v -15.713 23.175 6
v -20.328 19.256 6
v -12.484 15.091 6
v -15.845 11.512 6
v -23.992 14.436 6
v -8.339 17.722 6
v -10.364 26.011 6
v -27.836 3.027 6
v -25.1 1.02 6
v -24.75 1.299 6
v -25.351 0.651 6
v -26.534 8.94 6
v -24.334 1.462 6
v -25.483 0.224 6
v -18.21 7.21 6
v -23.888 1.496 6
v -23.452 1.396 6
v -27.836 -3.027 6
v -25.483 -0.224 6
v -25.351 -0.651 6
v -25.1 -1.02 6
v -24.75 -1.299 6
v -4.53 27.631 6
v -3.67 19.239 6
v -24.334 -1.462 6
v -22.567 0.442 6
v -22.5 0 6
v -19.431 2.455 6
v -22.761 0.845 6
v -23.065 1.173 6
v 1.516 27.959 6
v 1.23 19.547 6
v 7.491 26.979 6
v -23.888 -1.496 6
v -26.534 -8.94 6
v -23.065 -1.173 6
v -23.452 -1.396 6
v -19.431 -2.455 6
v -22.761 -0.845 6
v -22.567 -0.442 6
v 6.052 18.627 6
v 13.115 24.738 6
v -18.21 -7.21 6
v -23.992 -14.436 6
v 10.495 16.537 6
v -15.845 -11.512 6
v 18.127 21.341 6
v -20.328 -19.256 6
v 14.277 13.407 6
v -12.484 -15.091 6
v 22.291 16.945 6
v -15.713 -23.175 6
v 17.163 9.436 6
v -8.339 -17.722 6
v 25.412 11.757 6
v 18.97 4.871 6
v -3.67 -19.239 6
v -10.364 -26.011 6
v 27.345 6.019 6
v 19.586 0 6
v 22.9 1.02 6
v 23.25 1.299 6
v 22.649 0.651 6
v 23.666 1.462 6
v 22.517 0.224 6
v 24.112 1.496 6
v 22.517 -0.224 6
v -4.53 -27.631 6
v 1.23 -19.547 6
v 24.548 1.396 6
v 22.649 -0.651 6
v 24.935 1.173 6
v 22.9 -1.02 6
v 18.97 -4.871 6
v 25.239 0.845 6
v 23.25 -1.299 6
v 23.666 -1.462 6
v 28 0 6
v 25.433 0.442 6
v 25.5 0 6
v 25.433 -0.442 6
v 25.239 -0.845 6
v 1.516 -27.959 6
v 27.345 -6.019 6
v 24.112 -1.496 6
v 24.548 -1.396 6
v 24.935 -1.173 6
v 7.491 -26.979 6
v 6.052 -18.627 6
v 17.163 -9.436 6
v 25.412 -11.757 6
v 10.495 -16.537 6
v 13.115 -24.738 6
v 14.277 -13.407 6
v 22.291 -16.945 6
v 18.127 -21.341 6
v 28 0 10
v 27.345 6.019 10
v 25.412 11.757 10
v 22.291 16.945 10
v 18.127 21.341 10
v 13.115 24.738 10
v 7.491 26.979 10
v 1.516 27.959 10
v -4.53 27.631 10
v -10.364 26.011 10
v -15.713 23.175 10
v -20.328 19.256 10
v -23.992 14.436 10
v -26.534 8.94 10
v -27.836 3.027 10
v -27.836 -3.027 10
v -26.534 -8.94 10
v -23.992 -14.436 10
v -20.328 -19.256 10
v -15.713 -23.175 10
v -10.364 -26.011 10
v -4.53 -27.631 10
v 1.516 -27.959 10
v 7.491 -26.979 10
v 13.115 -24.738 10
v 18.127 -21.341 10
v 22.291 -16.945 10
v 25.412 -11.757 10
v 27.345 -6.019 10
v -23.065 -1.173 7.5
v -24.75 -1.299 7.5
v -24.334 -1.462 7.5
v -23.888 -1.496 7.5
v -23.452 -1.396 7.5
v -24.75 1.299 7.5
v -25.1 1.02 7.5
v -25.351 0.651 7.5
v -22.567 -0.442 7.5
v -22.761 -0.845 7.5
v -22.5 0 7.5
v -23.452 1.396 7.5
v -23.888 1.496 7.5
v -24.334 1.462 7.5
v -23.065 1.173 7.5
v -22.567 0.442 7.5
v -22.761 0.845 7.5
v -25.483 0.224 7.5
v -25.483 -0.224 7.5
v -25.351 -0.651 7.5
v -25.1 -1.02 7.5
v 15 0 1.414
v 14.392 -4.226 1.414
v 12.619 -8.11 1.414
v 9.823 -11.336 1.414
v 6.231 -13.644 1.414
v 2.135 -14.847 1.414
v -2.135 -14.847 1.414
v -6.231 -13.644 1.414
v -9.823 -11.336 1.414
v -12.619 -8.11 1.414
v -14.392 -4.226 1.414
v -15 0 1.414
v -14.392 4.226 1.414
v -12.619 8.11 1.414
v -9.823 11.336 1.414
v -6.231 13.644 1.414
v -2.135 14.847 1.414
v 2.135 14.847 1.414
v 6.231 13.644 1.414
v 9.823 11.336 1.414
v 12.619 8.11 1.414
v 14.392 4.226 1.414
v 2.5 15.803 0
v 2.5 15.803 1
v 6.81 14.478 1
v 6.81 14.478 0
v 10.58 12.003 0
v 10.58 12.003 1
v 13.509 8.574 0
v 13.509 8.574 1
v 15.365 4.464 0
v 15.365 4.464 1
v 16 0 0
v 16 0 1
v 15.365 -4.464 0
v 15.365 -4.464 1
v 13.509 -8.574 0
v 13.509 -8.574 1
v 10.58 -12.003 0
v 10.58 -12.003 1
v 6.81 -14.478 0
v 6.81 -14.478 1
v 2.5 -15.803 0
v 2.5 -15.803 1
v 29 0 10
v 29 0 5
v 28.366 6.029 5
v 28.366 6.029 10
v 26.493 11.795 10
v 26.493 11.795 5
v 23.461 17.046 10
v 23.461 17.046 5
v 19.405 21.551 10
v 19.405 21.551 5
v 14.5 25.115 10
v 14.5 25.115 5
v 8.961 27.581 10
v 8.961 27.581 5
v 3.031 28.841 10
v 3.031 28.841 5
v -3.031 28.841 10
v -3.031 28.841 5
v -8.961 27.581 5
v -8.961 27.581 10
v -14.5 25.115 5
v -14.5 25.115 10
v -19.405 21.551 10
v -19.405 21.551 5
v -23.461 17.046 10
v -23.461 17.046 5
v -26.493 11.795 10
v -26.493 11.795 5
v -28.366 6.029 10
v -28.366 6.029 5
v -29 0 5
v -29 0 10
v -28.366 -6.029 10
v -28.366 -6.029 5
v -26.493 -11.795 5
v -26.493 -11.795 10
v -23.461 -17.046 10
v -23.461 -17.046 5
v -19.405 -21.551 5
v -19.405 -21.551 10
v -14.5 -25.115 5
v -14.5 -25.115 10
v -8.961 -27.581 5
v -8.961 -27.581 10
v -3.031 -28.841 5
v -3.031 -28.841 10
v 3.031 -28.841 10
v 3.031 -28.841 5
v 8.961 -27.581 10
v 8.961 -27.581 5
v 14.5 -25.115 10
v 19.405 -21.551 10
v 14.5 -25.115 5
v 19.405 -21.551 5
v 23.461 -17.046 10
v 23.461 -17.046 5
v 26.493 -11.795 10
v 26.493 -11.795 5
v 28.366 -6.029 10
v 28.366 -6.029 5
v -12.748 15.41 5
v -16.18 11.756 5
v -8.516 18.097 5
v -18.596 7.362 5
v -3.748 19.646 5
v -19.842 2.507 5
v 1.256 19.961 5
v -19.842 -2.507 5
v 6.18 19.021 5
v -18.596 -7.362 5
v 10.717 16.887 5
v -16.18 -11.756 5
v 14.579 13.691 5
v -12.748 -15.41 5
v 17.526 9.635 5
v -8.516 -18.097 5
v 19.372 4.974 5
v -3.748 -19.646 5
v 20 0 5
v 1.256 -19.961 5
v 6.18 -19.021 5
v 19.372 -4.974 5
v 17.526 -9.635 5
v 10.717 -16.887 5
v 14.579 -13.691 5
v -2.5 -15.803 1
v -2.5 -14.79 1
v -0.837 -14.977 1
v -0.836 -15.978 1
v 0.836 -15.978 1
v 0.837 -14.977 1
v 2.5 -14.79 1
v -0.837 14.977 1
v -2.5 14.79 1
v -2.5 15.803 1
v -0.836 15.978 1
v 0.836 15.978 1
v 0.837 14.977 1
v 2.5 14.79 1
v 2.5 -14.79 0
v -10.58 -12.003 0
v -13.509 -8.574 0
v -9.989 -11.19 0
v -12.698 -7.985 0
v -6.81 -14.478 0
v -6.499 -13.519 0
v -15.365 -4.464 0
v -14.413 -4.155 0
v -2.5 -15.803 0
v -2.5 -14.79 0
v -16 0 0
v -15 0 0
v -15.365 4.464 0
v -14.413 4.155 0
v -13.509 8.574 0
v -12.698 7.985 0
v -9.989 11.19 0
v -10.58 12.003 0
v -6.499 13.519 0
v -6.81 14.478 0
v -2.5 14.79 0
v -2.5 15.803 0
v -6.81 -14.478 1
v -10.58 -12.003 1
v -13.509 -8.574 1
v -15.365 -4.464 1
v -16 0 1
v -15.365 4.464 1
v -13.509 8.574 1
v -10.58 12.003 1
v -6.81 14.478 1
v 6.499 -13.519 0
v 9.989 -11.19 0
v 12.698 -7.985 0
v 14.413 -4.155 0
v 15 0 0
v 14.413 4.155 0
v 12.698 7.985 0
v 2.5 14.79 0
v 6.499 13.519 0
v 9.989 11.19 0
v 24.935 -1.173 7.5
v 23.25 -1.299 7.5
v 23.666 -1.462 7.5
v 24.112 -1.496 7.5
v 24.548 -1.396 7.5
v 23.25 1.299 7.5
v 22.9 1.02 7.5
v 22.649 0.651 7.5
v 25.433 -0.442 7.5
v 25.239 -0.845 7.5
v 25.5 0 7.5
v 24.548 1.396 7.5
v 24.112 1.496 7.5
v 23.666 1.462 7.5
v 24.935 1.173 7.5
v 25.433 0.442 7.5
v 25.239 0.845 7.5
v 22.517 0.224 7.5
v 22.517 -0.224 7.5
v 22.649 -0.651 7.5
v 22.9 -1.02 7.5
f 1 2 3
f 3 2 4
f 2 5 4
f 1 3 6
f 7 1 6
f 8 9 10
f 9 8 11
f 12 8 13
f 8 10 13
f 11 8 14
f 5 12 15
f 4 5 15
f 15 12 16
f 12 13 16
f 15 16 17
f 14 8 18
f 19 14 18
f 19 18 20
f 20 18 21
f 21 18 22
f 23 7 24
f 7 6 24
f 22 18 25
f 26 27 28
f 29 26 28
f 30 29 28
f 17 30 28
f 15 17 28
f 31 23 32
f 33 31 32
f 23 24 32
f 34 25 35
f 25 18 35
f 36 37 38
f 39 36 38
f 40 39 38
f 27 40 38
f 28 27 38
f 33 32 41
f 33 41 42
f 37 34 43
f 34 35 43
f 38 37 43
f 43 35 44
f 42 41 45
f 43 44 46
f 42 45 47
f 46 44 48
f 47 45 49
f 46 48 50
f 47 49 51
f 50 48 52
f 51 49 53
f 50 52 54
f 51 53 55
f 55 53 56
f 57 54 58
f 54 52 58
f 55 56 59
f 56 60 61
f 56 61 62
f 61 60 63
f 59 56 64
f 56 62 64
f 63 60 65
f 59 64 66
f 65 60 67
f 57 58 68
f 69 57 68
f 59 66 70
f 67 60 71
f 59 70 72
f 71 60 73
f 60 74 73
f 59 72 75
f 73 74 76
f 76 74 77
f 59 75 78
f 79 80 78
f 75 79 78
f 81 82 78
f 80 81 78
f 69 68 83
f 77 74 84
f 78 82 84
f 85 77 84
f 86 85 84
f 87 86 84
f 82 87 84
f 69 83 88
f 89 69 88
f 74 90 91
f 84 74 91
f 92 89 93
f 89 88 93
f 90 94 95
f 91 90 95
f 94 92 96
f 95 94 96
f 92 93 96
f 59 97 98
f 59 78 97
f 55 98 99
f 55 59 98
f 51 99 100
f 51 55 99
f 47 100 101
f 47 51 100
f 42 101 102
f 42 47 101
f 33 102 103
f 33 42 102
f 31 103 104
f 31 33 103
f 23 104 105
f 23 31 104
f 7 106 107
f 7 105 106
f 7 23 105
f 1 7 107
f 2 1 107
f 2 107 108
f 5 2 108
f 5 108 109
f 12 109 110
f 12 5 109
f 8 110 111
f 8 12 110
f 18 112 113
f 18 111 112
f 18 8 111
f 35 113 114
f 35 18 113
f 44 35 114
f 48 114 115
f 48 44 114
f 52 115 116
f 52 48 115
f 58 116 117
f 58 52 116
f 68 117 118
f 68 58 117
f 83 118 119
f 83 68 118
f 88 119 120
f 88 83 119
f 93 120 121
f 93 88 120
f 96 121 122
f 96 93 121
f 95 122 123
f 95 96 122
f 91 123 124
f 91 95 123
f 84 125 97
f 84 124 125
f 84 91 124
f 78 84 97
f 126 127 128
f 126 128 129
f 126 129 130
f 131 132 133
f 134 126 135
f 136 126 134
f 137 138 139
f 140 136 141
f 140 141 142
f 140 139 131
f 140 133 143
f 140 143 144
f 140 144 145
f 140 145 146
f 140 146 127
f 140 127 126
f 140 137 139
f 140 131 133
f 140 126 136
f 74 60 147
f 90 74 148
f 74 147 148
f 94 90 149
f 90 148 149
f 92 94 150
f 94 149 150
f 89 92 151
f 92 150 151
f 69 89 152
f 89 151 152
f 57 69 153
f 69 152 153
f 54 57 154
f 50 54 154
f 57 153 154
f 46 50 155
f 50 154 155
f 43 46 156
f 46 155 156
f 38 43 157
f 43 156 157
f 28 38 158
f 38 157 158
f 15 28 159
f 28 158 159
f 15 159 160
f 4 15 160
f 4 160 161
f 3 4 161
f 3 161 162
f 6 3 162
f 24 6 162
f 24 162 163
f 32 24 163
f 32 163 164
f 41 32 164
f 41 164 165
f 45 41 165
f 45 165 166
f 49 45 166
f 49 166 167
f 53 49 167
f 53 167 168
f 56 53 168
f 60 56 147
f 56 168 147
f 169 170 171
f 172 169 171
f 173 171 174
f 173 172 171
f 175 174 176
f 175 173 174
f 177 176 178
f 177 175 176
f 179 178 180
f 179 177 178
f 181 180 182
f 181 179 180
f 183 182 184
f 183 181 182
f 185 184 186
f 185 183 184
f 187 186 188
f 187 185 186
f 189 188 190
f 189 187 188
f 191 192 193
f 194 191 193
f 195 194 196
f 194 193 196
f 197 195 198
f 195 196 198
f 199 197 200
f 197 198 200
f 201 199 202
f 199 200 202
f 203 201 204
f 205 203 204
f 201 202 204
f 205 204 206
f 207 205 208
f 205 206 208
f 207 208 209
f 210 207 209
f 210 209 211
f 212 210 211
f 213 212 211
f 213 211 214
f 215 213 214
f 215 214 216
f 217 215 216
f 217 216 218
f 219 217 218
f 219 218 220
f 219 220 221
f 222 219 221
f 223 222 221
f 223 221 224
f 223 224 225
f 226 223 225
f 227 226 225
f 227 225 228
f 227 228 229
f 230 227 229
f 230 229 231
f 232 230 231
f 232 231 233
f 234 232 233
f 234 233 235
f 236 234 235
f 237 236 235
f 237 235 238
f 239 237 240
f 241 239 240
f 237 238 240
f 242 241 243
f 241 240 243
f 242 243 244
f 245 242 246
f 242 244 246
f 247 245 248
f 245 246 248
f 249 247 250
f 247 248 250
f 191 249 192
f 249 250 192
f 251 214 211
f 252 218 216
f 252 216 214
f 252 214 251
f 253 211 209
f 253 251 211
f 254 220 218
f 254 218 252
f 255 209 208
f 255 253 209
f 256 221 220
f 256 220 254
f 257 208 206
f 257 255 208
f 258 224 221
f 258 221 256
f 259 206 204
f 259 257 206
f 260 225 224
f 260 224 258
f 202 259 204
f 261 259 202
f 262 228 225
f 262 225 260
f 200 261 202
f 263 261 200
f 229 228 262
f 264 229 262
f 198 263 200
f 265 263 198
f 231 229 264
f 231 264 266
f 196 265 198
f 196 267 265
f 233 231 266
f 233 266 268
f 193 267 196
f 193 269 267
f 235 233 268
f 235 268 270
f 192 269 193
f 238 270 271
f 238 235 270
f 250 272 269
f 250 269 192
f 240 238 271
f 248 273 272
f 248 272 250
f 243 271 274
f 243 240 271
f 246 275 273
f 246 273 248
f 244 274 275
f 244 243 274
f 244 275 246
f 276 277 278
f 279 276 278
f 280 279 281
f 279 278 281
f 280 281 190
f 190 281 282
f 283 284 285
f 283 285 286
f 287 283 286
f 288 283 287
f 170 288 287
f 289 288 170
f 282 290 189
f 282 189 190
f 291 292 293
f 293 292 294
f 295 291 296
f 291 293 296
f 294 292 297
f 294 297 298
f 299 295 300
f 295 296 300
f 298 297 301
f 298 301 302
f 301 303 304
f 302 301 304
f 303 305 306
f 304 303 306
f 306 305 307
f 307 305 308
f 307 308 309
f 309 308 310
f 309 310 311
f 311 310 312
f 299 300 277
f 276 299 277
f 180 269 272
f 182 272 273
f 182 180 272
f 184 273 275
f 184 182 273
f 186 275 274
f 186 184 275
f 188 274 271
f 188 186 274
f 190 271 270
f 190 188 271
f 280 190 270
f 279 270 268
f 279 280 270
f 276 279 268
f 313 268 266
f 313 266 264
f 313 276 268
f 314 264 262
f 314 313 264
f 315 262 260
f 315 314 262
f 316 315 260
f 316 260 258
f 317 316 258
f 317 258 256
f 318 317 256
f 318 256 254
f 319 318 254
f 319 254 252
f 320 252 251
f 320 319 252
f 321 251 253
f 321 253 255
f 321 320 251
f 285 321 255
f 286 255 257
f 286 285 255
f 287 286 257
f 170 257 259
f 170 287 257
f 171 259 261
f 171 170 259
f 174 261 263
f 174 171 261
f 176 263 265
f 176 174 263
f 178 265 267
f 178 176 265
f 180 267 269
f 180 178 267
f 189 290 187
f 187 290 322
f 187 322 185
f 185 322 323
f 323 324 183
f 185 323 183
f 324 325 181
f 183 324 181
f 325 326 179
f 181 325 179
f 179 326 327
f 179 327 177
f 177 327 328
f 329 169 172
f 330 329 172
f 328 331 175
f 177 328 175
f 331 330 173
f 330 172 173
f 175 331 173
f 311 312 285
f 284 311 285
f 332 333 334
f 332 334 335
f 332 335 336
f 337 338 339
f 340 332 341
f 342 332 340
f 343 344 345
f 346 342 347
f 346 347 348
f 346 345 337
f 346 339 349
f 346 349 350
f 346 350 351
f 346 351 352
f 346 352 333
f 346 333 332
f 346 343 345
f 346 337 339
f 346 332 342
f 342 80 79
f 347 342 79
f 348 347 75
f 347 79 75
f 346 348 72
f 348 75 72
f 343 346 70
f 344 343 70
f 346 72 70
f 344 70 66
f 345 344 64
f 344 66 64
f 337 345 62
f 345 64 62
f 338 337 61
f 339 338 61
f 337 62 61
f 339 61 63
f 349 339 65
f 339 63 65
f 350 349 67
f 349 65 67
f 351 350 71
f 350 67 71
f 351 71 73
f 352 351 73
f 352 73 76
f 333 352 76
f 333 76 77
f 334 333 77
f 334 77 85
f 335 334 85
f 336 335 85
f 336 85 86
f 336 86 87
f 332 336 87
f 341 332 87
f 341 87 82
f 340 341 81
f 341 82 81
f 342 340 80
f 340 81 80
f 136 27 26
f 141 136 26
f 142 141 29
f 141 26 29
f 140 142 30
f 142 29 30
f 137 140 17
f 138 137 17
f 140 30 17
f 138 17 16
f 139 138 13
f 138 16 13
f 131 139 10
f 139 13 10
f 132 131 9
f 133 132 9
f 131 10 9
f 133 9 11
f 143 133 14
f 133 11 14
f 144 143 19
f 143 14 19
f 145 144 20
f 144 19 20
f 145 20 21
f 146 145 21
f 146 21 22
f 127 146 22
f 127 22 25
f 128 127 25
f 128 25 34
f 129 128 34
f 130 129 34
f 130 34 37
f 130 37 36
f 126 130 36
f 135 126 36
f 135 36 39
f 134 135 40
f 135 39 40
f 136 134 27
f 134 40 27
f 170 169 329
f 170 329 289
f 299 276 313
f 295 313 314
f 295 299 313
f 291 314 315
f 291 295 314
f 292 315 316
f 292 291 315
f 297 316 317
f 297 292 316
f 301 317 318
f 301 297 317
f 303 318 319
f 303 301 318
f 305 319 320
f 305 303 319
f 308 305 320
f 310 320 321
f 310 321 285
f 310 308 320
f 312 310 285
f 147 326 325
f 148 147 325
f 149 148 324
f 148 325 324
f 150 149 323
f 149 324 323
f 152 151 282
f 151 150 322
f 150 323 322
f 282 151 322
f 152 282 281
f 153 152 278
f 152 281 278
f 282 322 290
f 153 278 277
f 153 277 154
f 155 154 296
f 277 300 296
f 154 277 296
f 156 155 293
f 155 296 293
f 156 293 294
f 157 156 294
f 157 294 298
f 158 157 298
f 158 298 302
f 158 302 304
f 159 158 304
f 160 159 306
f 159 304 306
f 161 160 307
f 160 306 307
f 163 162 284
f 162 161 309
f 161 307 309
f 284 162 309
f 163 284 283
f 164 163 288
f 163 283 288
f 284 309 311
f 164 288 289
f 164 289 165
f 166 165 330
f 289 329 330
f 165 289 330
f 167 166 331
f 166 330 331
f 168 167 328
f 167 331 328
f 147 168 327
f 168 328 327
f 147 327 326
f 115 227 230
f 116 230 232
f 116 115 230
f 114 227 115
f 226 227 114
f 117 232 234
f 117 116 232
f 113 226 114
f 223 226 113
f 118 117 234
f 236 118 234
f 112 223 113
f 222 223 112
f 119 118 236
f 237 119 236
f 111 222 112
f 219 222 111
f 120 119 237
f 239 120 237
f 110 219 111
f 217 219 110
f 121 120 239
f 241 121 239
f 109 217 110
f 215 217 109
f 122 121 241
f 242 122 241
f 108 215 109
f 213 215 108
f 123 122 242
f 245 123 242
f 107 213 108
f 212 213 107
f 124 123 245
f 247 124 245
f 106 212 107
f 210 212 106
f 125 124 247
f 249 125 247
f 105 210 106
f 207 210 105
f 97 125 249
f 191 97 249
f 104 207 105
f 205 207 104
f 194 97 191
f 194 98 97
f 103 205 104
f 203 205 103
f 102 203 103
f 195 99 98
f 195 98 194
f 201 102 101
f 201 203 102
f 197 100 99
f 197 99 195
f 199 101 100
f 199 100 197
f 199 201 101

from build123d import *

# Parameters (mm, degrees)
F0_R          = 29
F1_DEPTH      = 10
F2_R          = 29
F2_R_2        = 16
F3_DEPTH      = 5
F4_SIZE       = 4
F5_T          = -1
F6_R          = 1.5
F7_DEPTH      = 1.5
F8_W          = 5
F8_H          = 1
F9_DEPTH      = 29.001
F9_DEPTH_BACK = 29.001


with BuildPart() as f1:
    # F0 (on Top) → F1 (new body)
    with BuildSketch(Plane.XY):
        Circle(F0_R)
    extrude(amount=F1_DEPTH)

    # F2 (on face) → F3 (cut)
    with BuildSketch(Plane(origin=(0, 0, 0), x_dir=(1, 0, 0), z_dir=(0, 0, -1))):
        Circle(F2_R)
        Circle(F2_R_2, mode=Mode.SUBTRACT)
    extrude(amount=-F3_DEPTH, mode=Mode.SUBTRACT)

    # F4
    f4_edges = [f1.edges().sort_by_distance(p)[0] for p in [
        (-16, 0, 5),
    ]]
    chamfer(f4_edges, length=F4_SIZE)

    # F5
    f5_openings = [f1.faces().sort_by_distance(p)[0] for p in [
        (0, 0, 10),
        (0, 0, 0),
    ]]
    offset(amount=F5_T, openings=f5_openings, kind=Kind.INTERSECTION)

    # F6 (on face) → F7 (join)
    with BuildSketch(Plane.XY.offset(6)):
        with Locations((-24, 0)):
            Circle(F6_R)
        with Locations((24, 0)):
            Circle(F6_R)
    extrude(amount=F7_DEPTH)

    # F8 (on Front) → F9 (cut, two sides)
    with BuildSketch(Plane.XZ) as f9_sk:
        with Locations((0, 0.5)):
            Rectangle(F8_W, F8_H)
    extrude(amount=-F9_DEPTH, mode=Mode.SUBTRACT)
    extrude(f9_sk.sketch, amount=F9_DEPTH_BACK, mode=Mode.SUBTRACT)


solid = f1.part
